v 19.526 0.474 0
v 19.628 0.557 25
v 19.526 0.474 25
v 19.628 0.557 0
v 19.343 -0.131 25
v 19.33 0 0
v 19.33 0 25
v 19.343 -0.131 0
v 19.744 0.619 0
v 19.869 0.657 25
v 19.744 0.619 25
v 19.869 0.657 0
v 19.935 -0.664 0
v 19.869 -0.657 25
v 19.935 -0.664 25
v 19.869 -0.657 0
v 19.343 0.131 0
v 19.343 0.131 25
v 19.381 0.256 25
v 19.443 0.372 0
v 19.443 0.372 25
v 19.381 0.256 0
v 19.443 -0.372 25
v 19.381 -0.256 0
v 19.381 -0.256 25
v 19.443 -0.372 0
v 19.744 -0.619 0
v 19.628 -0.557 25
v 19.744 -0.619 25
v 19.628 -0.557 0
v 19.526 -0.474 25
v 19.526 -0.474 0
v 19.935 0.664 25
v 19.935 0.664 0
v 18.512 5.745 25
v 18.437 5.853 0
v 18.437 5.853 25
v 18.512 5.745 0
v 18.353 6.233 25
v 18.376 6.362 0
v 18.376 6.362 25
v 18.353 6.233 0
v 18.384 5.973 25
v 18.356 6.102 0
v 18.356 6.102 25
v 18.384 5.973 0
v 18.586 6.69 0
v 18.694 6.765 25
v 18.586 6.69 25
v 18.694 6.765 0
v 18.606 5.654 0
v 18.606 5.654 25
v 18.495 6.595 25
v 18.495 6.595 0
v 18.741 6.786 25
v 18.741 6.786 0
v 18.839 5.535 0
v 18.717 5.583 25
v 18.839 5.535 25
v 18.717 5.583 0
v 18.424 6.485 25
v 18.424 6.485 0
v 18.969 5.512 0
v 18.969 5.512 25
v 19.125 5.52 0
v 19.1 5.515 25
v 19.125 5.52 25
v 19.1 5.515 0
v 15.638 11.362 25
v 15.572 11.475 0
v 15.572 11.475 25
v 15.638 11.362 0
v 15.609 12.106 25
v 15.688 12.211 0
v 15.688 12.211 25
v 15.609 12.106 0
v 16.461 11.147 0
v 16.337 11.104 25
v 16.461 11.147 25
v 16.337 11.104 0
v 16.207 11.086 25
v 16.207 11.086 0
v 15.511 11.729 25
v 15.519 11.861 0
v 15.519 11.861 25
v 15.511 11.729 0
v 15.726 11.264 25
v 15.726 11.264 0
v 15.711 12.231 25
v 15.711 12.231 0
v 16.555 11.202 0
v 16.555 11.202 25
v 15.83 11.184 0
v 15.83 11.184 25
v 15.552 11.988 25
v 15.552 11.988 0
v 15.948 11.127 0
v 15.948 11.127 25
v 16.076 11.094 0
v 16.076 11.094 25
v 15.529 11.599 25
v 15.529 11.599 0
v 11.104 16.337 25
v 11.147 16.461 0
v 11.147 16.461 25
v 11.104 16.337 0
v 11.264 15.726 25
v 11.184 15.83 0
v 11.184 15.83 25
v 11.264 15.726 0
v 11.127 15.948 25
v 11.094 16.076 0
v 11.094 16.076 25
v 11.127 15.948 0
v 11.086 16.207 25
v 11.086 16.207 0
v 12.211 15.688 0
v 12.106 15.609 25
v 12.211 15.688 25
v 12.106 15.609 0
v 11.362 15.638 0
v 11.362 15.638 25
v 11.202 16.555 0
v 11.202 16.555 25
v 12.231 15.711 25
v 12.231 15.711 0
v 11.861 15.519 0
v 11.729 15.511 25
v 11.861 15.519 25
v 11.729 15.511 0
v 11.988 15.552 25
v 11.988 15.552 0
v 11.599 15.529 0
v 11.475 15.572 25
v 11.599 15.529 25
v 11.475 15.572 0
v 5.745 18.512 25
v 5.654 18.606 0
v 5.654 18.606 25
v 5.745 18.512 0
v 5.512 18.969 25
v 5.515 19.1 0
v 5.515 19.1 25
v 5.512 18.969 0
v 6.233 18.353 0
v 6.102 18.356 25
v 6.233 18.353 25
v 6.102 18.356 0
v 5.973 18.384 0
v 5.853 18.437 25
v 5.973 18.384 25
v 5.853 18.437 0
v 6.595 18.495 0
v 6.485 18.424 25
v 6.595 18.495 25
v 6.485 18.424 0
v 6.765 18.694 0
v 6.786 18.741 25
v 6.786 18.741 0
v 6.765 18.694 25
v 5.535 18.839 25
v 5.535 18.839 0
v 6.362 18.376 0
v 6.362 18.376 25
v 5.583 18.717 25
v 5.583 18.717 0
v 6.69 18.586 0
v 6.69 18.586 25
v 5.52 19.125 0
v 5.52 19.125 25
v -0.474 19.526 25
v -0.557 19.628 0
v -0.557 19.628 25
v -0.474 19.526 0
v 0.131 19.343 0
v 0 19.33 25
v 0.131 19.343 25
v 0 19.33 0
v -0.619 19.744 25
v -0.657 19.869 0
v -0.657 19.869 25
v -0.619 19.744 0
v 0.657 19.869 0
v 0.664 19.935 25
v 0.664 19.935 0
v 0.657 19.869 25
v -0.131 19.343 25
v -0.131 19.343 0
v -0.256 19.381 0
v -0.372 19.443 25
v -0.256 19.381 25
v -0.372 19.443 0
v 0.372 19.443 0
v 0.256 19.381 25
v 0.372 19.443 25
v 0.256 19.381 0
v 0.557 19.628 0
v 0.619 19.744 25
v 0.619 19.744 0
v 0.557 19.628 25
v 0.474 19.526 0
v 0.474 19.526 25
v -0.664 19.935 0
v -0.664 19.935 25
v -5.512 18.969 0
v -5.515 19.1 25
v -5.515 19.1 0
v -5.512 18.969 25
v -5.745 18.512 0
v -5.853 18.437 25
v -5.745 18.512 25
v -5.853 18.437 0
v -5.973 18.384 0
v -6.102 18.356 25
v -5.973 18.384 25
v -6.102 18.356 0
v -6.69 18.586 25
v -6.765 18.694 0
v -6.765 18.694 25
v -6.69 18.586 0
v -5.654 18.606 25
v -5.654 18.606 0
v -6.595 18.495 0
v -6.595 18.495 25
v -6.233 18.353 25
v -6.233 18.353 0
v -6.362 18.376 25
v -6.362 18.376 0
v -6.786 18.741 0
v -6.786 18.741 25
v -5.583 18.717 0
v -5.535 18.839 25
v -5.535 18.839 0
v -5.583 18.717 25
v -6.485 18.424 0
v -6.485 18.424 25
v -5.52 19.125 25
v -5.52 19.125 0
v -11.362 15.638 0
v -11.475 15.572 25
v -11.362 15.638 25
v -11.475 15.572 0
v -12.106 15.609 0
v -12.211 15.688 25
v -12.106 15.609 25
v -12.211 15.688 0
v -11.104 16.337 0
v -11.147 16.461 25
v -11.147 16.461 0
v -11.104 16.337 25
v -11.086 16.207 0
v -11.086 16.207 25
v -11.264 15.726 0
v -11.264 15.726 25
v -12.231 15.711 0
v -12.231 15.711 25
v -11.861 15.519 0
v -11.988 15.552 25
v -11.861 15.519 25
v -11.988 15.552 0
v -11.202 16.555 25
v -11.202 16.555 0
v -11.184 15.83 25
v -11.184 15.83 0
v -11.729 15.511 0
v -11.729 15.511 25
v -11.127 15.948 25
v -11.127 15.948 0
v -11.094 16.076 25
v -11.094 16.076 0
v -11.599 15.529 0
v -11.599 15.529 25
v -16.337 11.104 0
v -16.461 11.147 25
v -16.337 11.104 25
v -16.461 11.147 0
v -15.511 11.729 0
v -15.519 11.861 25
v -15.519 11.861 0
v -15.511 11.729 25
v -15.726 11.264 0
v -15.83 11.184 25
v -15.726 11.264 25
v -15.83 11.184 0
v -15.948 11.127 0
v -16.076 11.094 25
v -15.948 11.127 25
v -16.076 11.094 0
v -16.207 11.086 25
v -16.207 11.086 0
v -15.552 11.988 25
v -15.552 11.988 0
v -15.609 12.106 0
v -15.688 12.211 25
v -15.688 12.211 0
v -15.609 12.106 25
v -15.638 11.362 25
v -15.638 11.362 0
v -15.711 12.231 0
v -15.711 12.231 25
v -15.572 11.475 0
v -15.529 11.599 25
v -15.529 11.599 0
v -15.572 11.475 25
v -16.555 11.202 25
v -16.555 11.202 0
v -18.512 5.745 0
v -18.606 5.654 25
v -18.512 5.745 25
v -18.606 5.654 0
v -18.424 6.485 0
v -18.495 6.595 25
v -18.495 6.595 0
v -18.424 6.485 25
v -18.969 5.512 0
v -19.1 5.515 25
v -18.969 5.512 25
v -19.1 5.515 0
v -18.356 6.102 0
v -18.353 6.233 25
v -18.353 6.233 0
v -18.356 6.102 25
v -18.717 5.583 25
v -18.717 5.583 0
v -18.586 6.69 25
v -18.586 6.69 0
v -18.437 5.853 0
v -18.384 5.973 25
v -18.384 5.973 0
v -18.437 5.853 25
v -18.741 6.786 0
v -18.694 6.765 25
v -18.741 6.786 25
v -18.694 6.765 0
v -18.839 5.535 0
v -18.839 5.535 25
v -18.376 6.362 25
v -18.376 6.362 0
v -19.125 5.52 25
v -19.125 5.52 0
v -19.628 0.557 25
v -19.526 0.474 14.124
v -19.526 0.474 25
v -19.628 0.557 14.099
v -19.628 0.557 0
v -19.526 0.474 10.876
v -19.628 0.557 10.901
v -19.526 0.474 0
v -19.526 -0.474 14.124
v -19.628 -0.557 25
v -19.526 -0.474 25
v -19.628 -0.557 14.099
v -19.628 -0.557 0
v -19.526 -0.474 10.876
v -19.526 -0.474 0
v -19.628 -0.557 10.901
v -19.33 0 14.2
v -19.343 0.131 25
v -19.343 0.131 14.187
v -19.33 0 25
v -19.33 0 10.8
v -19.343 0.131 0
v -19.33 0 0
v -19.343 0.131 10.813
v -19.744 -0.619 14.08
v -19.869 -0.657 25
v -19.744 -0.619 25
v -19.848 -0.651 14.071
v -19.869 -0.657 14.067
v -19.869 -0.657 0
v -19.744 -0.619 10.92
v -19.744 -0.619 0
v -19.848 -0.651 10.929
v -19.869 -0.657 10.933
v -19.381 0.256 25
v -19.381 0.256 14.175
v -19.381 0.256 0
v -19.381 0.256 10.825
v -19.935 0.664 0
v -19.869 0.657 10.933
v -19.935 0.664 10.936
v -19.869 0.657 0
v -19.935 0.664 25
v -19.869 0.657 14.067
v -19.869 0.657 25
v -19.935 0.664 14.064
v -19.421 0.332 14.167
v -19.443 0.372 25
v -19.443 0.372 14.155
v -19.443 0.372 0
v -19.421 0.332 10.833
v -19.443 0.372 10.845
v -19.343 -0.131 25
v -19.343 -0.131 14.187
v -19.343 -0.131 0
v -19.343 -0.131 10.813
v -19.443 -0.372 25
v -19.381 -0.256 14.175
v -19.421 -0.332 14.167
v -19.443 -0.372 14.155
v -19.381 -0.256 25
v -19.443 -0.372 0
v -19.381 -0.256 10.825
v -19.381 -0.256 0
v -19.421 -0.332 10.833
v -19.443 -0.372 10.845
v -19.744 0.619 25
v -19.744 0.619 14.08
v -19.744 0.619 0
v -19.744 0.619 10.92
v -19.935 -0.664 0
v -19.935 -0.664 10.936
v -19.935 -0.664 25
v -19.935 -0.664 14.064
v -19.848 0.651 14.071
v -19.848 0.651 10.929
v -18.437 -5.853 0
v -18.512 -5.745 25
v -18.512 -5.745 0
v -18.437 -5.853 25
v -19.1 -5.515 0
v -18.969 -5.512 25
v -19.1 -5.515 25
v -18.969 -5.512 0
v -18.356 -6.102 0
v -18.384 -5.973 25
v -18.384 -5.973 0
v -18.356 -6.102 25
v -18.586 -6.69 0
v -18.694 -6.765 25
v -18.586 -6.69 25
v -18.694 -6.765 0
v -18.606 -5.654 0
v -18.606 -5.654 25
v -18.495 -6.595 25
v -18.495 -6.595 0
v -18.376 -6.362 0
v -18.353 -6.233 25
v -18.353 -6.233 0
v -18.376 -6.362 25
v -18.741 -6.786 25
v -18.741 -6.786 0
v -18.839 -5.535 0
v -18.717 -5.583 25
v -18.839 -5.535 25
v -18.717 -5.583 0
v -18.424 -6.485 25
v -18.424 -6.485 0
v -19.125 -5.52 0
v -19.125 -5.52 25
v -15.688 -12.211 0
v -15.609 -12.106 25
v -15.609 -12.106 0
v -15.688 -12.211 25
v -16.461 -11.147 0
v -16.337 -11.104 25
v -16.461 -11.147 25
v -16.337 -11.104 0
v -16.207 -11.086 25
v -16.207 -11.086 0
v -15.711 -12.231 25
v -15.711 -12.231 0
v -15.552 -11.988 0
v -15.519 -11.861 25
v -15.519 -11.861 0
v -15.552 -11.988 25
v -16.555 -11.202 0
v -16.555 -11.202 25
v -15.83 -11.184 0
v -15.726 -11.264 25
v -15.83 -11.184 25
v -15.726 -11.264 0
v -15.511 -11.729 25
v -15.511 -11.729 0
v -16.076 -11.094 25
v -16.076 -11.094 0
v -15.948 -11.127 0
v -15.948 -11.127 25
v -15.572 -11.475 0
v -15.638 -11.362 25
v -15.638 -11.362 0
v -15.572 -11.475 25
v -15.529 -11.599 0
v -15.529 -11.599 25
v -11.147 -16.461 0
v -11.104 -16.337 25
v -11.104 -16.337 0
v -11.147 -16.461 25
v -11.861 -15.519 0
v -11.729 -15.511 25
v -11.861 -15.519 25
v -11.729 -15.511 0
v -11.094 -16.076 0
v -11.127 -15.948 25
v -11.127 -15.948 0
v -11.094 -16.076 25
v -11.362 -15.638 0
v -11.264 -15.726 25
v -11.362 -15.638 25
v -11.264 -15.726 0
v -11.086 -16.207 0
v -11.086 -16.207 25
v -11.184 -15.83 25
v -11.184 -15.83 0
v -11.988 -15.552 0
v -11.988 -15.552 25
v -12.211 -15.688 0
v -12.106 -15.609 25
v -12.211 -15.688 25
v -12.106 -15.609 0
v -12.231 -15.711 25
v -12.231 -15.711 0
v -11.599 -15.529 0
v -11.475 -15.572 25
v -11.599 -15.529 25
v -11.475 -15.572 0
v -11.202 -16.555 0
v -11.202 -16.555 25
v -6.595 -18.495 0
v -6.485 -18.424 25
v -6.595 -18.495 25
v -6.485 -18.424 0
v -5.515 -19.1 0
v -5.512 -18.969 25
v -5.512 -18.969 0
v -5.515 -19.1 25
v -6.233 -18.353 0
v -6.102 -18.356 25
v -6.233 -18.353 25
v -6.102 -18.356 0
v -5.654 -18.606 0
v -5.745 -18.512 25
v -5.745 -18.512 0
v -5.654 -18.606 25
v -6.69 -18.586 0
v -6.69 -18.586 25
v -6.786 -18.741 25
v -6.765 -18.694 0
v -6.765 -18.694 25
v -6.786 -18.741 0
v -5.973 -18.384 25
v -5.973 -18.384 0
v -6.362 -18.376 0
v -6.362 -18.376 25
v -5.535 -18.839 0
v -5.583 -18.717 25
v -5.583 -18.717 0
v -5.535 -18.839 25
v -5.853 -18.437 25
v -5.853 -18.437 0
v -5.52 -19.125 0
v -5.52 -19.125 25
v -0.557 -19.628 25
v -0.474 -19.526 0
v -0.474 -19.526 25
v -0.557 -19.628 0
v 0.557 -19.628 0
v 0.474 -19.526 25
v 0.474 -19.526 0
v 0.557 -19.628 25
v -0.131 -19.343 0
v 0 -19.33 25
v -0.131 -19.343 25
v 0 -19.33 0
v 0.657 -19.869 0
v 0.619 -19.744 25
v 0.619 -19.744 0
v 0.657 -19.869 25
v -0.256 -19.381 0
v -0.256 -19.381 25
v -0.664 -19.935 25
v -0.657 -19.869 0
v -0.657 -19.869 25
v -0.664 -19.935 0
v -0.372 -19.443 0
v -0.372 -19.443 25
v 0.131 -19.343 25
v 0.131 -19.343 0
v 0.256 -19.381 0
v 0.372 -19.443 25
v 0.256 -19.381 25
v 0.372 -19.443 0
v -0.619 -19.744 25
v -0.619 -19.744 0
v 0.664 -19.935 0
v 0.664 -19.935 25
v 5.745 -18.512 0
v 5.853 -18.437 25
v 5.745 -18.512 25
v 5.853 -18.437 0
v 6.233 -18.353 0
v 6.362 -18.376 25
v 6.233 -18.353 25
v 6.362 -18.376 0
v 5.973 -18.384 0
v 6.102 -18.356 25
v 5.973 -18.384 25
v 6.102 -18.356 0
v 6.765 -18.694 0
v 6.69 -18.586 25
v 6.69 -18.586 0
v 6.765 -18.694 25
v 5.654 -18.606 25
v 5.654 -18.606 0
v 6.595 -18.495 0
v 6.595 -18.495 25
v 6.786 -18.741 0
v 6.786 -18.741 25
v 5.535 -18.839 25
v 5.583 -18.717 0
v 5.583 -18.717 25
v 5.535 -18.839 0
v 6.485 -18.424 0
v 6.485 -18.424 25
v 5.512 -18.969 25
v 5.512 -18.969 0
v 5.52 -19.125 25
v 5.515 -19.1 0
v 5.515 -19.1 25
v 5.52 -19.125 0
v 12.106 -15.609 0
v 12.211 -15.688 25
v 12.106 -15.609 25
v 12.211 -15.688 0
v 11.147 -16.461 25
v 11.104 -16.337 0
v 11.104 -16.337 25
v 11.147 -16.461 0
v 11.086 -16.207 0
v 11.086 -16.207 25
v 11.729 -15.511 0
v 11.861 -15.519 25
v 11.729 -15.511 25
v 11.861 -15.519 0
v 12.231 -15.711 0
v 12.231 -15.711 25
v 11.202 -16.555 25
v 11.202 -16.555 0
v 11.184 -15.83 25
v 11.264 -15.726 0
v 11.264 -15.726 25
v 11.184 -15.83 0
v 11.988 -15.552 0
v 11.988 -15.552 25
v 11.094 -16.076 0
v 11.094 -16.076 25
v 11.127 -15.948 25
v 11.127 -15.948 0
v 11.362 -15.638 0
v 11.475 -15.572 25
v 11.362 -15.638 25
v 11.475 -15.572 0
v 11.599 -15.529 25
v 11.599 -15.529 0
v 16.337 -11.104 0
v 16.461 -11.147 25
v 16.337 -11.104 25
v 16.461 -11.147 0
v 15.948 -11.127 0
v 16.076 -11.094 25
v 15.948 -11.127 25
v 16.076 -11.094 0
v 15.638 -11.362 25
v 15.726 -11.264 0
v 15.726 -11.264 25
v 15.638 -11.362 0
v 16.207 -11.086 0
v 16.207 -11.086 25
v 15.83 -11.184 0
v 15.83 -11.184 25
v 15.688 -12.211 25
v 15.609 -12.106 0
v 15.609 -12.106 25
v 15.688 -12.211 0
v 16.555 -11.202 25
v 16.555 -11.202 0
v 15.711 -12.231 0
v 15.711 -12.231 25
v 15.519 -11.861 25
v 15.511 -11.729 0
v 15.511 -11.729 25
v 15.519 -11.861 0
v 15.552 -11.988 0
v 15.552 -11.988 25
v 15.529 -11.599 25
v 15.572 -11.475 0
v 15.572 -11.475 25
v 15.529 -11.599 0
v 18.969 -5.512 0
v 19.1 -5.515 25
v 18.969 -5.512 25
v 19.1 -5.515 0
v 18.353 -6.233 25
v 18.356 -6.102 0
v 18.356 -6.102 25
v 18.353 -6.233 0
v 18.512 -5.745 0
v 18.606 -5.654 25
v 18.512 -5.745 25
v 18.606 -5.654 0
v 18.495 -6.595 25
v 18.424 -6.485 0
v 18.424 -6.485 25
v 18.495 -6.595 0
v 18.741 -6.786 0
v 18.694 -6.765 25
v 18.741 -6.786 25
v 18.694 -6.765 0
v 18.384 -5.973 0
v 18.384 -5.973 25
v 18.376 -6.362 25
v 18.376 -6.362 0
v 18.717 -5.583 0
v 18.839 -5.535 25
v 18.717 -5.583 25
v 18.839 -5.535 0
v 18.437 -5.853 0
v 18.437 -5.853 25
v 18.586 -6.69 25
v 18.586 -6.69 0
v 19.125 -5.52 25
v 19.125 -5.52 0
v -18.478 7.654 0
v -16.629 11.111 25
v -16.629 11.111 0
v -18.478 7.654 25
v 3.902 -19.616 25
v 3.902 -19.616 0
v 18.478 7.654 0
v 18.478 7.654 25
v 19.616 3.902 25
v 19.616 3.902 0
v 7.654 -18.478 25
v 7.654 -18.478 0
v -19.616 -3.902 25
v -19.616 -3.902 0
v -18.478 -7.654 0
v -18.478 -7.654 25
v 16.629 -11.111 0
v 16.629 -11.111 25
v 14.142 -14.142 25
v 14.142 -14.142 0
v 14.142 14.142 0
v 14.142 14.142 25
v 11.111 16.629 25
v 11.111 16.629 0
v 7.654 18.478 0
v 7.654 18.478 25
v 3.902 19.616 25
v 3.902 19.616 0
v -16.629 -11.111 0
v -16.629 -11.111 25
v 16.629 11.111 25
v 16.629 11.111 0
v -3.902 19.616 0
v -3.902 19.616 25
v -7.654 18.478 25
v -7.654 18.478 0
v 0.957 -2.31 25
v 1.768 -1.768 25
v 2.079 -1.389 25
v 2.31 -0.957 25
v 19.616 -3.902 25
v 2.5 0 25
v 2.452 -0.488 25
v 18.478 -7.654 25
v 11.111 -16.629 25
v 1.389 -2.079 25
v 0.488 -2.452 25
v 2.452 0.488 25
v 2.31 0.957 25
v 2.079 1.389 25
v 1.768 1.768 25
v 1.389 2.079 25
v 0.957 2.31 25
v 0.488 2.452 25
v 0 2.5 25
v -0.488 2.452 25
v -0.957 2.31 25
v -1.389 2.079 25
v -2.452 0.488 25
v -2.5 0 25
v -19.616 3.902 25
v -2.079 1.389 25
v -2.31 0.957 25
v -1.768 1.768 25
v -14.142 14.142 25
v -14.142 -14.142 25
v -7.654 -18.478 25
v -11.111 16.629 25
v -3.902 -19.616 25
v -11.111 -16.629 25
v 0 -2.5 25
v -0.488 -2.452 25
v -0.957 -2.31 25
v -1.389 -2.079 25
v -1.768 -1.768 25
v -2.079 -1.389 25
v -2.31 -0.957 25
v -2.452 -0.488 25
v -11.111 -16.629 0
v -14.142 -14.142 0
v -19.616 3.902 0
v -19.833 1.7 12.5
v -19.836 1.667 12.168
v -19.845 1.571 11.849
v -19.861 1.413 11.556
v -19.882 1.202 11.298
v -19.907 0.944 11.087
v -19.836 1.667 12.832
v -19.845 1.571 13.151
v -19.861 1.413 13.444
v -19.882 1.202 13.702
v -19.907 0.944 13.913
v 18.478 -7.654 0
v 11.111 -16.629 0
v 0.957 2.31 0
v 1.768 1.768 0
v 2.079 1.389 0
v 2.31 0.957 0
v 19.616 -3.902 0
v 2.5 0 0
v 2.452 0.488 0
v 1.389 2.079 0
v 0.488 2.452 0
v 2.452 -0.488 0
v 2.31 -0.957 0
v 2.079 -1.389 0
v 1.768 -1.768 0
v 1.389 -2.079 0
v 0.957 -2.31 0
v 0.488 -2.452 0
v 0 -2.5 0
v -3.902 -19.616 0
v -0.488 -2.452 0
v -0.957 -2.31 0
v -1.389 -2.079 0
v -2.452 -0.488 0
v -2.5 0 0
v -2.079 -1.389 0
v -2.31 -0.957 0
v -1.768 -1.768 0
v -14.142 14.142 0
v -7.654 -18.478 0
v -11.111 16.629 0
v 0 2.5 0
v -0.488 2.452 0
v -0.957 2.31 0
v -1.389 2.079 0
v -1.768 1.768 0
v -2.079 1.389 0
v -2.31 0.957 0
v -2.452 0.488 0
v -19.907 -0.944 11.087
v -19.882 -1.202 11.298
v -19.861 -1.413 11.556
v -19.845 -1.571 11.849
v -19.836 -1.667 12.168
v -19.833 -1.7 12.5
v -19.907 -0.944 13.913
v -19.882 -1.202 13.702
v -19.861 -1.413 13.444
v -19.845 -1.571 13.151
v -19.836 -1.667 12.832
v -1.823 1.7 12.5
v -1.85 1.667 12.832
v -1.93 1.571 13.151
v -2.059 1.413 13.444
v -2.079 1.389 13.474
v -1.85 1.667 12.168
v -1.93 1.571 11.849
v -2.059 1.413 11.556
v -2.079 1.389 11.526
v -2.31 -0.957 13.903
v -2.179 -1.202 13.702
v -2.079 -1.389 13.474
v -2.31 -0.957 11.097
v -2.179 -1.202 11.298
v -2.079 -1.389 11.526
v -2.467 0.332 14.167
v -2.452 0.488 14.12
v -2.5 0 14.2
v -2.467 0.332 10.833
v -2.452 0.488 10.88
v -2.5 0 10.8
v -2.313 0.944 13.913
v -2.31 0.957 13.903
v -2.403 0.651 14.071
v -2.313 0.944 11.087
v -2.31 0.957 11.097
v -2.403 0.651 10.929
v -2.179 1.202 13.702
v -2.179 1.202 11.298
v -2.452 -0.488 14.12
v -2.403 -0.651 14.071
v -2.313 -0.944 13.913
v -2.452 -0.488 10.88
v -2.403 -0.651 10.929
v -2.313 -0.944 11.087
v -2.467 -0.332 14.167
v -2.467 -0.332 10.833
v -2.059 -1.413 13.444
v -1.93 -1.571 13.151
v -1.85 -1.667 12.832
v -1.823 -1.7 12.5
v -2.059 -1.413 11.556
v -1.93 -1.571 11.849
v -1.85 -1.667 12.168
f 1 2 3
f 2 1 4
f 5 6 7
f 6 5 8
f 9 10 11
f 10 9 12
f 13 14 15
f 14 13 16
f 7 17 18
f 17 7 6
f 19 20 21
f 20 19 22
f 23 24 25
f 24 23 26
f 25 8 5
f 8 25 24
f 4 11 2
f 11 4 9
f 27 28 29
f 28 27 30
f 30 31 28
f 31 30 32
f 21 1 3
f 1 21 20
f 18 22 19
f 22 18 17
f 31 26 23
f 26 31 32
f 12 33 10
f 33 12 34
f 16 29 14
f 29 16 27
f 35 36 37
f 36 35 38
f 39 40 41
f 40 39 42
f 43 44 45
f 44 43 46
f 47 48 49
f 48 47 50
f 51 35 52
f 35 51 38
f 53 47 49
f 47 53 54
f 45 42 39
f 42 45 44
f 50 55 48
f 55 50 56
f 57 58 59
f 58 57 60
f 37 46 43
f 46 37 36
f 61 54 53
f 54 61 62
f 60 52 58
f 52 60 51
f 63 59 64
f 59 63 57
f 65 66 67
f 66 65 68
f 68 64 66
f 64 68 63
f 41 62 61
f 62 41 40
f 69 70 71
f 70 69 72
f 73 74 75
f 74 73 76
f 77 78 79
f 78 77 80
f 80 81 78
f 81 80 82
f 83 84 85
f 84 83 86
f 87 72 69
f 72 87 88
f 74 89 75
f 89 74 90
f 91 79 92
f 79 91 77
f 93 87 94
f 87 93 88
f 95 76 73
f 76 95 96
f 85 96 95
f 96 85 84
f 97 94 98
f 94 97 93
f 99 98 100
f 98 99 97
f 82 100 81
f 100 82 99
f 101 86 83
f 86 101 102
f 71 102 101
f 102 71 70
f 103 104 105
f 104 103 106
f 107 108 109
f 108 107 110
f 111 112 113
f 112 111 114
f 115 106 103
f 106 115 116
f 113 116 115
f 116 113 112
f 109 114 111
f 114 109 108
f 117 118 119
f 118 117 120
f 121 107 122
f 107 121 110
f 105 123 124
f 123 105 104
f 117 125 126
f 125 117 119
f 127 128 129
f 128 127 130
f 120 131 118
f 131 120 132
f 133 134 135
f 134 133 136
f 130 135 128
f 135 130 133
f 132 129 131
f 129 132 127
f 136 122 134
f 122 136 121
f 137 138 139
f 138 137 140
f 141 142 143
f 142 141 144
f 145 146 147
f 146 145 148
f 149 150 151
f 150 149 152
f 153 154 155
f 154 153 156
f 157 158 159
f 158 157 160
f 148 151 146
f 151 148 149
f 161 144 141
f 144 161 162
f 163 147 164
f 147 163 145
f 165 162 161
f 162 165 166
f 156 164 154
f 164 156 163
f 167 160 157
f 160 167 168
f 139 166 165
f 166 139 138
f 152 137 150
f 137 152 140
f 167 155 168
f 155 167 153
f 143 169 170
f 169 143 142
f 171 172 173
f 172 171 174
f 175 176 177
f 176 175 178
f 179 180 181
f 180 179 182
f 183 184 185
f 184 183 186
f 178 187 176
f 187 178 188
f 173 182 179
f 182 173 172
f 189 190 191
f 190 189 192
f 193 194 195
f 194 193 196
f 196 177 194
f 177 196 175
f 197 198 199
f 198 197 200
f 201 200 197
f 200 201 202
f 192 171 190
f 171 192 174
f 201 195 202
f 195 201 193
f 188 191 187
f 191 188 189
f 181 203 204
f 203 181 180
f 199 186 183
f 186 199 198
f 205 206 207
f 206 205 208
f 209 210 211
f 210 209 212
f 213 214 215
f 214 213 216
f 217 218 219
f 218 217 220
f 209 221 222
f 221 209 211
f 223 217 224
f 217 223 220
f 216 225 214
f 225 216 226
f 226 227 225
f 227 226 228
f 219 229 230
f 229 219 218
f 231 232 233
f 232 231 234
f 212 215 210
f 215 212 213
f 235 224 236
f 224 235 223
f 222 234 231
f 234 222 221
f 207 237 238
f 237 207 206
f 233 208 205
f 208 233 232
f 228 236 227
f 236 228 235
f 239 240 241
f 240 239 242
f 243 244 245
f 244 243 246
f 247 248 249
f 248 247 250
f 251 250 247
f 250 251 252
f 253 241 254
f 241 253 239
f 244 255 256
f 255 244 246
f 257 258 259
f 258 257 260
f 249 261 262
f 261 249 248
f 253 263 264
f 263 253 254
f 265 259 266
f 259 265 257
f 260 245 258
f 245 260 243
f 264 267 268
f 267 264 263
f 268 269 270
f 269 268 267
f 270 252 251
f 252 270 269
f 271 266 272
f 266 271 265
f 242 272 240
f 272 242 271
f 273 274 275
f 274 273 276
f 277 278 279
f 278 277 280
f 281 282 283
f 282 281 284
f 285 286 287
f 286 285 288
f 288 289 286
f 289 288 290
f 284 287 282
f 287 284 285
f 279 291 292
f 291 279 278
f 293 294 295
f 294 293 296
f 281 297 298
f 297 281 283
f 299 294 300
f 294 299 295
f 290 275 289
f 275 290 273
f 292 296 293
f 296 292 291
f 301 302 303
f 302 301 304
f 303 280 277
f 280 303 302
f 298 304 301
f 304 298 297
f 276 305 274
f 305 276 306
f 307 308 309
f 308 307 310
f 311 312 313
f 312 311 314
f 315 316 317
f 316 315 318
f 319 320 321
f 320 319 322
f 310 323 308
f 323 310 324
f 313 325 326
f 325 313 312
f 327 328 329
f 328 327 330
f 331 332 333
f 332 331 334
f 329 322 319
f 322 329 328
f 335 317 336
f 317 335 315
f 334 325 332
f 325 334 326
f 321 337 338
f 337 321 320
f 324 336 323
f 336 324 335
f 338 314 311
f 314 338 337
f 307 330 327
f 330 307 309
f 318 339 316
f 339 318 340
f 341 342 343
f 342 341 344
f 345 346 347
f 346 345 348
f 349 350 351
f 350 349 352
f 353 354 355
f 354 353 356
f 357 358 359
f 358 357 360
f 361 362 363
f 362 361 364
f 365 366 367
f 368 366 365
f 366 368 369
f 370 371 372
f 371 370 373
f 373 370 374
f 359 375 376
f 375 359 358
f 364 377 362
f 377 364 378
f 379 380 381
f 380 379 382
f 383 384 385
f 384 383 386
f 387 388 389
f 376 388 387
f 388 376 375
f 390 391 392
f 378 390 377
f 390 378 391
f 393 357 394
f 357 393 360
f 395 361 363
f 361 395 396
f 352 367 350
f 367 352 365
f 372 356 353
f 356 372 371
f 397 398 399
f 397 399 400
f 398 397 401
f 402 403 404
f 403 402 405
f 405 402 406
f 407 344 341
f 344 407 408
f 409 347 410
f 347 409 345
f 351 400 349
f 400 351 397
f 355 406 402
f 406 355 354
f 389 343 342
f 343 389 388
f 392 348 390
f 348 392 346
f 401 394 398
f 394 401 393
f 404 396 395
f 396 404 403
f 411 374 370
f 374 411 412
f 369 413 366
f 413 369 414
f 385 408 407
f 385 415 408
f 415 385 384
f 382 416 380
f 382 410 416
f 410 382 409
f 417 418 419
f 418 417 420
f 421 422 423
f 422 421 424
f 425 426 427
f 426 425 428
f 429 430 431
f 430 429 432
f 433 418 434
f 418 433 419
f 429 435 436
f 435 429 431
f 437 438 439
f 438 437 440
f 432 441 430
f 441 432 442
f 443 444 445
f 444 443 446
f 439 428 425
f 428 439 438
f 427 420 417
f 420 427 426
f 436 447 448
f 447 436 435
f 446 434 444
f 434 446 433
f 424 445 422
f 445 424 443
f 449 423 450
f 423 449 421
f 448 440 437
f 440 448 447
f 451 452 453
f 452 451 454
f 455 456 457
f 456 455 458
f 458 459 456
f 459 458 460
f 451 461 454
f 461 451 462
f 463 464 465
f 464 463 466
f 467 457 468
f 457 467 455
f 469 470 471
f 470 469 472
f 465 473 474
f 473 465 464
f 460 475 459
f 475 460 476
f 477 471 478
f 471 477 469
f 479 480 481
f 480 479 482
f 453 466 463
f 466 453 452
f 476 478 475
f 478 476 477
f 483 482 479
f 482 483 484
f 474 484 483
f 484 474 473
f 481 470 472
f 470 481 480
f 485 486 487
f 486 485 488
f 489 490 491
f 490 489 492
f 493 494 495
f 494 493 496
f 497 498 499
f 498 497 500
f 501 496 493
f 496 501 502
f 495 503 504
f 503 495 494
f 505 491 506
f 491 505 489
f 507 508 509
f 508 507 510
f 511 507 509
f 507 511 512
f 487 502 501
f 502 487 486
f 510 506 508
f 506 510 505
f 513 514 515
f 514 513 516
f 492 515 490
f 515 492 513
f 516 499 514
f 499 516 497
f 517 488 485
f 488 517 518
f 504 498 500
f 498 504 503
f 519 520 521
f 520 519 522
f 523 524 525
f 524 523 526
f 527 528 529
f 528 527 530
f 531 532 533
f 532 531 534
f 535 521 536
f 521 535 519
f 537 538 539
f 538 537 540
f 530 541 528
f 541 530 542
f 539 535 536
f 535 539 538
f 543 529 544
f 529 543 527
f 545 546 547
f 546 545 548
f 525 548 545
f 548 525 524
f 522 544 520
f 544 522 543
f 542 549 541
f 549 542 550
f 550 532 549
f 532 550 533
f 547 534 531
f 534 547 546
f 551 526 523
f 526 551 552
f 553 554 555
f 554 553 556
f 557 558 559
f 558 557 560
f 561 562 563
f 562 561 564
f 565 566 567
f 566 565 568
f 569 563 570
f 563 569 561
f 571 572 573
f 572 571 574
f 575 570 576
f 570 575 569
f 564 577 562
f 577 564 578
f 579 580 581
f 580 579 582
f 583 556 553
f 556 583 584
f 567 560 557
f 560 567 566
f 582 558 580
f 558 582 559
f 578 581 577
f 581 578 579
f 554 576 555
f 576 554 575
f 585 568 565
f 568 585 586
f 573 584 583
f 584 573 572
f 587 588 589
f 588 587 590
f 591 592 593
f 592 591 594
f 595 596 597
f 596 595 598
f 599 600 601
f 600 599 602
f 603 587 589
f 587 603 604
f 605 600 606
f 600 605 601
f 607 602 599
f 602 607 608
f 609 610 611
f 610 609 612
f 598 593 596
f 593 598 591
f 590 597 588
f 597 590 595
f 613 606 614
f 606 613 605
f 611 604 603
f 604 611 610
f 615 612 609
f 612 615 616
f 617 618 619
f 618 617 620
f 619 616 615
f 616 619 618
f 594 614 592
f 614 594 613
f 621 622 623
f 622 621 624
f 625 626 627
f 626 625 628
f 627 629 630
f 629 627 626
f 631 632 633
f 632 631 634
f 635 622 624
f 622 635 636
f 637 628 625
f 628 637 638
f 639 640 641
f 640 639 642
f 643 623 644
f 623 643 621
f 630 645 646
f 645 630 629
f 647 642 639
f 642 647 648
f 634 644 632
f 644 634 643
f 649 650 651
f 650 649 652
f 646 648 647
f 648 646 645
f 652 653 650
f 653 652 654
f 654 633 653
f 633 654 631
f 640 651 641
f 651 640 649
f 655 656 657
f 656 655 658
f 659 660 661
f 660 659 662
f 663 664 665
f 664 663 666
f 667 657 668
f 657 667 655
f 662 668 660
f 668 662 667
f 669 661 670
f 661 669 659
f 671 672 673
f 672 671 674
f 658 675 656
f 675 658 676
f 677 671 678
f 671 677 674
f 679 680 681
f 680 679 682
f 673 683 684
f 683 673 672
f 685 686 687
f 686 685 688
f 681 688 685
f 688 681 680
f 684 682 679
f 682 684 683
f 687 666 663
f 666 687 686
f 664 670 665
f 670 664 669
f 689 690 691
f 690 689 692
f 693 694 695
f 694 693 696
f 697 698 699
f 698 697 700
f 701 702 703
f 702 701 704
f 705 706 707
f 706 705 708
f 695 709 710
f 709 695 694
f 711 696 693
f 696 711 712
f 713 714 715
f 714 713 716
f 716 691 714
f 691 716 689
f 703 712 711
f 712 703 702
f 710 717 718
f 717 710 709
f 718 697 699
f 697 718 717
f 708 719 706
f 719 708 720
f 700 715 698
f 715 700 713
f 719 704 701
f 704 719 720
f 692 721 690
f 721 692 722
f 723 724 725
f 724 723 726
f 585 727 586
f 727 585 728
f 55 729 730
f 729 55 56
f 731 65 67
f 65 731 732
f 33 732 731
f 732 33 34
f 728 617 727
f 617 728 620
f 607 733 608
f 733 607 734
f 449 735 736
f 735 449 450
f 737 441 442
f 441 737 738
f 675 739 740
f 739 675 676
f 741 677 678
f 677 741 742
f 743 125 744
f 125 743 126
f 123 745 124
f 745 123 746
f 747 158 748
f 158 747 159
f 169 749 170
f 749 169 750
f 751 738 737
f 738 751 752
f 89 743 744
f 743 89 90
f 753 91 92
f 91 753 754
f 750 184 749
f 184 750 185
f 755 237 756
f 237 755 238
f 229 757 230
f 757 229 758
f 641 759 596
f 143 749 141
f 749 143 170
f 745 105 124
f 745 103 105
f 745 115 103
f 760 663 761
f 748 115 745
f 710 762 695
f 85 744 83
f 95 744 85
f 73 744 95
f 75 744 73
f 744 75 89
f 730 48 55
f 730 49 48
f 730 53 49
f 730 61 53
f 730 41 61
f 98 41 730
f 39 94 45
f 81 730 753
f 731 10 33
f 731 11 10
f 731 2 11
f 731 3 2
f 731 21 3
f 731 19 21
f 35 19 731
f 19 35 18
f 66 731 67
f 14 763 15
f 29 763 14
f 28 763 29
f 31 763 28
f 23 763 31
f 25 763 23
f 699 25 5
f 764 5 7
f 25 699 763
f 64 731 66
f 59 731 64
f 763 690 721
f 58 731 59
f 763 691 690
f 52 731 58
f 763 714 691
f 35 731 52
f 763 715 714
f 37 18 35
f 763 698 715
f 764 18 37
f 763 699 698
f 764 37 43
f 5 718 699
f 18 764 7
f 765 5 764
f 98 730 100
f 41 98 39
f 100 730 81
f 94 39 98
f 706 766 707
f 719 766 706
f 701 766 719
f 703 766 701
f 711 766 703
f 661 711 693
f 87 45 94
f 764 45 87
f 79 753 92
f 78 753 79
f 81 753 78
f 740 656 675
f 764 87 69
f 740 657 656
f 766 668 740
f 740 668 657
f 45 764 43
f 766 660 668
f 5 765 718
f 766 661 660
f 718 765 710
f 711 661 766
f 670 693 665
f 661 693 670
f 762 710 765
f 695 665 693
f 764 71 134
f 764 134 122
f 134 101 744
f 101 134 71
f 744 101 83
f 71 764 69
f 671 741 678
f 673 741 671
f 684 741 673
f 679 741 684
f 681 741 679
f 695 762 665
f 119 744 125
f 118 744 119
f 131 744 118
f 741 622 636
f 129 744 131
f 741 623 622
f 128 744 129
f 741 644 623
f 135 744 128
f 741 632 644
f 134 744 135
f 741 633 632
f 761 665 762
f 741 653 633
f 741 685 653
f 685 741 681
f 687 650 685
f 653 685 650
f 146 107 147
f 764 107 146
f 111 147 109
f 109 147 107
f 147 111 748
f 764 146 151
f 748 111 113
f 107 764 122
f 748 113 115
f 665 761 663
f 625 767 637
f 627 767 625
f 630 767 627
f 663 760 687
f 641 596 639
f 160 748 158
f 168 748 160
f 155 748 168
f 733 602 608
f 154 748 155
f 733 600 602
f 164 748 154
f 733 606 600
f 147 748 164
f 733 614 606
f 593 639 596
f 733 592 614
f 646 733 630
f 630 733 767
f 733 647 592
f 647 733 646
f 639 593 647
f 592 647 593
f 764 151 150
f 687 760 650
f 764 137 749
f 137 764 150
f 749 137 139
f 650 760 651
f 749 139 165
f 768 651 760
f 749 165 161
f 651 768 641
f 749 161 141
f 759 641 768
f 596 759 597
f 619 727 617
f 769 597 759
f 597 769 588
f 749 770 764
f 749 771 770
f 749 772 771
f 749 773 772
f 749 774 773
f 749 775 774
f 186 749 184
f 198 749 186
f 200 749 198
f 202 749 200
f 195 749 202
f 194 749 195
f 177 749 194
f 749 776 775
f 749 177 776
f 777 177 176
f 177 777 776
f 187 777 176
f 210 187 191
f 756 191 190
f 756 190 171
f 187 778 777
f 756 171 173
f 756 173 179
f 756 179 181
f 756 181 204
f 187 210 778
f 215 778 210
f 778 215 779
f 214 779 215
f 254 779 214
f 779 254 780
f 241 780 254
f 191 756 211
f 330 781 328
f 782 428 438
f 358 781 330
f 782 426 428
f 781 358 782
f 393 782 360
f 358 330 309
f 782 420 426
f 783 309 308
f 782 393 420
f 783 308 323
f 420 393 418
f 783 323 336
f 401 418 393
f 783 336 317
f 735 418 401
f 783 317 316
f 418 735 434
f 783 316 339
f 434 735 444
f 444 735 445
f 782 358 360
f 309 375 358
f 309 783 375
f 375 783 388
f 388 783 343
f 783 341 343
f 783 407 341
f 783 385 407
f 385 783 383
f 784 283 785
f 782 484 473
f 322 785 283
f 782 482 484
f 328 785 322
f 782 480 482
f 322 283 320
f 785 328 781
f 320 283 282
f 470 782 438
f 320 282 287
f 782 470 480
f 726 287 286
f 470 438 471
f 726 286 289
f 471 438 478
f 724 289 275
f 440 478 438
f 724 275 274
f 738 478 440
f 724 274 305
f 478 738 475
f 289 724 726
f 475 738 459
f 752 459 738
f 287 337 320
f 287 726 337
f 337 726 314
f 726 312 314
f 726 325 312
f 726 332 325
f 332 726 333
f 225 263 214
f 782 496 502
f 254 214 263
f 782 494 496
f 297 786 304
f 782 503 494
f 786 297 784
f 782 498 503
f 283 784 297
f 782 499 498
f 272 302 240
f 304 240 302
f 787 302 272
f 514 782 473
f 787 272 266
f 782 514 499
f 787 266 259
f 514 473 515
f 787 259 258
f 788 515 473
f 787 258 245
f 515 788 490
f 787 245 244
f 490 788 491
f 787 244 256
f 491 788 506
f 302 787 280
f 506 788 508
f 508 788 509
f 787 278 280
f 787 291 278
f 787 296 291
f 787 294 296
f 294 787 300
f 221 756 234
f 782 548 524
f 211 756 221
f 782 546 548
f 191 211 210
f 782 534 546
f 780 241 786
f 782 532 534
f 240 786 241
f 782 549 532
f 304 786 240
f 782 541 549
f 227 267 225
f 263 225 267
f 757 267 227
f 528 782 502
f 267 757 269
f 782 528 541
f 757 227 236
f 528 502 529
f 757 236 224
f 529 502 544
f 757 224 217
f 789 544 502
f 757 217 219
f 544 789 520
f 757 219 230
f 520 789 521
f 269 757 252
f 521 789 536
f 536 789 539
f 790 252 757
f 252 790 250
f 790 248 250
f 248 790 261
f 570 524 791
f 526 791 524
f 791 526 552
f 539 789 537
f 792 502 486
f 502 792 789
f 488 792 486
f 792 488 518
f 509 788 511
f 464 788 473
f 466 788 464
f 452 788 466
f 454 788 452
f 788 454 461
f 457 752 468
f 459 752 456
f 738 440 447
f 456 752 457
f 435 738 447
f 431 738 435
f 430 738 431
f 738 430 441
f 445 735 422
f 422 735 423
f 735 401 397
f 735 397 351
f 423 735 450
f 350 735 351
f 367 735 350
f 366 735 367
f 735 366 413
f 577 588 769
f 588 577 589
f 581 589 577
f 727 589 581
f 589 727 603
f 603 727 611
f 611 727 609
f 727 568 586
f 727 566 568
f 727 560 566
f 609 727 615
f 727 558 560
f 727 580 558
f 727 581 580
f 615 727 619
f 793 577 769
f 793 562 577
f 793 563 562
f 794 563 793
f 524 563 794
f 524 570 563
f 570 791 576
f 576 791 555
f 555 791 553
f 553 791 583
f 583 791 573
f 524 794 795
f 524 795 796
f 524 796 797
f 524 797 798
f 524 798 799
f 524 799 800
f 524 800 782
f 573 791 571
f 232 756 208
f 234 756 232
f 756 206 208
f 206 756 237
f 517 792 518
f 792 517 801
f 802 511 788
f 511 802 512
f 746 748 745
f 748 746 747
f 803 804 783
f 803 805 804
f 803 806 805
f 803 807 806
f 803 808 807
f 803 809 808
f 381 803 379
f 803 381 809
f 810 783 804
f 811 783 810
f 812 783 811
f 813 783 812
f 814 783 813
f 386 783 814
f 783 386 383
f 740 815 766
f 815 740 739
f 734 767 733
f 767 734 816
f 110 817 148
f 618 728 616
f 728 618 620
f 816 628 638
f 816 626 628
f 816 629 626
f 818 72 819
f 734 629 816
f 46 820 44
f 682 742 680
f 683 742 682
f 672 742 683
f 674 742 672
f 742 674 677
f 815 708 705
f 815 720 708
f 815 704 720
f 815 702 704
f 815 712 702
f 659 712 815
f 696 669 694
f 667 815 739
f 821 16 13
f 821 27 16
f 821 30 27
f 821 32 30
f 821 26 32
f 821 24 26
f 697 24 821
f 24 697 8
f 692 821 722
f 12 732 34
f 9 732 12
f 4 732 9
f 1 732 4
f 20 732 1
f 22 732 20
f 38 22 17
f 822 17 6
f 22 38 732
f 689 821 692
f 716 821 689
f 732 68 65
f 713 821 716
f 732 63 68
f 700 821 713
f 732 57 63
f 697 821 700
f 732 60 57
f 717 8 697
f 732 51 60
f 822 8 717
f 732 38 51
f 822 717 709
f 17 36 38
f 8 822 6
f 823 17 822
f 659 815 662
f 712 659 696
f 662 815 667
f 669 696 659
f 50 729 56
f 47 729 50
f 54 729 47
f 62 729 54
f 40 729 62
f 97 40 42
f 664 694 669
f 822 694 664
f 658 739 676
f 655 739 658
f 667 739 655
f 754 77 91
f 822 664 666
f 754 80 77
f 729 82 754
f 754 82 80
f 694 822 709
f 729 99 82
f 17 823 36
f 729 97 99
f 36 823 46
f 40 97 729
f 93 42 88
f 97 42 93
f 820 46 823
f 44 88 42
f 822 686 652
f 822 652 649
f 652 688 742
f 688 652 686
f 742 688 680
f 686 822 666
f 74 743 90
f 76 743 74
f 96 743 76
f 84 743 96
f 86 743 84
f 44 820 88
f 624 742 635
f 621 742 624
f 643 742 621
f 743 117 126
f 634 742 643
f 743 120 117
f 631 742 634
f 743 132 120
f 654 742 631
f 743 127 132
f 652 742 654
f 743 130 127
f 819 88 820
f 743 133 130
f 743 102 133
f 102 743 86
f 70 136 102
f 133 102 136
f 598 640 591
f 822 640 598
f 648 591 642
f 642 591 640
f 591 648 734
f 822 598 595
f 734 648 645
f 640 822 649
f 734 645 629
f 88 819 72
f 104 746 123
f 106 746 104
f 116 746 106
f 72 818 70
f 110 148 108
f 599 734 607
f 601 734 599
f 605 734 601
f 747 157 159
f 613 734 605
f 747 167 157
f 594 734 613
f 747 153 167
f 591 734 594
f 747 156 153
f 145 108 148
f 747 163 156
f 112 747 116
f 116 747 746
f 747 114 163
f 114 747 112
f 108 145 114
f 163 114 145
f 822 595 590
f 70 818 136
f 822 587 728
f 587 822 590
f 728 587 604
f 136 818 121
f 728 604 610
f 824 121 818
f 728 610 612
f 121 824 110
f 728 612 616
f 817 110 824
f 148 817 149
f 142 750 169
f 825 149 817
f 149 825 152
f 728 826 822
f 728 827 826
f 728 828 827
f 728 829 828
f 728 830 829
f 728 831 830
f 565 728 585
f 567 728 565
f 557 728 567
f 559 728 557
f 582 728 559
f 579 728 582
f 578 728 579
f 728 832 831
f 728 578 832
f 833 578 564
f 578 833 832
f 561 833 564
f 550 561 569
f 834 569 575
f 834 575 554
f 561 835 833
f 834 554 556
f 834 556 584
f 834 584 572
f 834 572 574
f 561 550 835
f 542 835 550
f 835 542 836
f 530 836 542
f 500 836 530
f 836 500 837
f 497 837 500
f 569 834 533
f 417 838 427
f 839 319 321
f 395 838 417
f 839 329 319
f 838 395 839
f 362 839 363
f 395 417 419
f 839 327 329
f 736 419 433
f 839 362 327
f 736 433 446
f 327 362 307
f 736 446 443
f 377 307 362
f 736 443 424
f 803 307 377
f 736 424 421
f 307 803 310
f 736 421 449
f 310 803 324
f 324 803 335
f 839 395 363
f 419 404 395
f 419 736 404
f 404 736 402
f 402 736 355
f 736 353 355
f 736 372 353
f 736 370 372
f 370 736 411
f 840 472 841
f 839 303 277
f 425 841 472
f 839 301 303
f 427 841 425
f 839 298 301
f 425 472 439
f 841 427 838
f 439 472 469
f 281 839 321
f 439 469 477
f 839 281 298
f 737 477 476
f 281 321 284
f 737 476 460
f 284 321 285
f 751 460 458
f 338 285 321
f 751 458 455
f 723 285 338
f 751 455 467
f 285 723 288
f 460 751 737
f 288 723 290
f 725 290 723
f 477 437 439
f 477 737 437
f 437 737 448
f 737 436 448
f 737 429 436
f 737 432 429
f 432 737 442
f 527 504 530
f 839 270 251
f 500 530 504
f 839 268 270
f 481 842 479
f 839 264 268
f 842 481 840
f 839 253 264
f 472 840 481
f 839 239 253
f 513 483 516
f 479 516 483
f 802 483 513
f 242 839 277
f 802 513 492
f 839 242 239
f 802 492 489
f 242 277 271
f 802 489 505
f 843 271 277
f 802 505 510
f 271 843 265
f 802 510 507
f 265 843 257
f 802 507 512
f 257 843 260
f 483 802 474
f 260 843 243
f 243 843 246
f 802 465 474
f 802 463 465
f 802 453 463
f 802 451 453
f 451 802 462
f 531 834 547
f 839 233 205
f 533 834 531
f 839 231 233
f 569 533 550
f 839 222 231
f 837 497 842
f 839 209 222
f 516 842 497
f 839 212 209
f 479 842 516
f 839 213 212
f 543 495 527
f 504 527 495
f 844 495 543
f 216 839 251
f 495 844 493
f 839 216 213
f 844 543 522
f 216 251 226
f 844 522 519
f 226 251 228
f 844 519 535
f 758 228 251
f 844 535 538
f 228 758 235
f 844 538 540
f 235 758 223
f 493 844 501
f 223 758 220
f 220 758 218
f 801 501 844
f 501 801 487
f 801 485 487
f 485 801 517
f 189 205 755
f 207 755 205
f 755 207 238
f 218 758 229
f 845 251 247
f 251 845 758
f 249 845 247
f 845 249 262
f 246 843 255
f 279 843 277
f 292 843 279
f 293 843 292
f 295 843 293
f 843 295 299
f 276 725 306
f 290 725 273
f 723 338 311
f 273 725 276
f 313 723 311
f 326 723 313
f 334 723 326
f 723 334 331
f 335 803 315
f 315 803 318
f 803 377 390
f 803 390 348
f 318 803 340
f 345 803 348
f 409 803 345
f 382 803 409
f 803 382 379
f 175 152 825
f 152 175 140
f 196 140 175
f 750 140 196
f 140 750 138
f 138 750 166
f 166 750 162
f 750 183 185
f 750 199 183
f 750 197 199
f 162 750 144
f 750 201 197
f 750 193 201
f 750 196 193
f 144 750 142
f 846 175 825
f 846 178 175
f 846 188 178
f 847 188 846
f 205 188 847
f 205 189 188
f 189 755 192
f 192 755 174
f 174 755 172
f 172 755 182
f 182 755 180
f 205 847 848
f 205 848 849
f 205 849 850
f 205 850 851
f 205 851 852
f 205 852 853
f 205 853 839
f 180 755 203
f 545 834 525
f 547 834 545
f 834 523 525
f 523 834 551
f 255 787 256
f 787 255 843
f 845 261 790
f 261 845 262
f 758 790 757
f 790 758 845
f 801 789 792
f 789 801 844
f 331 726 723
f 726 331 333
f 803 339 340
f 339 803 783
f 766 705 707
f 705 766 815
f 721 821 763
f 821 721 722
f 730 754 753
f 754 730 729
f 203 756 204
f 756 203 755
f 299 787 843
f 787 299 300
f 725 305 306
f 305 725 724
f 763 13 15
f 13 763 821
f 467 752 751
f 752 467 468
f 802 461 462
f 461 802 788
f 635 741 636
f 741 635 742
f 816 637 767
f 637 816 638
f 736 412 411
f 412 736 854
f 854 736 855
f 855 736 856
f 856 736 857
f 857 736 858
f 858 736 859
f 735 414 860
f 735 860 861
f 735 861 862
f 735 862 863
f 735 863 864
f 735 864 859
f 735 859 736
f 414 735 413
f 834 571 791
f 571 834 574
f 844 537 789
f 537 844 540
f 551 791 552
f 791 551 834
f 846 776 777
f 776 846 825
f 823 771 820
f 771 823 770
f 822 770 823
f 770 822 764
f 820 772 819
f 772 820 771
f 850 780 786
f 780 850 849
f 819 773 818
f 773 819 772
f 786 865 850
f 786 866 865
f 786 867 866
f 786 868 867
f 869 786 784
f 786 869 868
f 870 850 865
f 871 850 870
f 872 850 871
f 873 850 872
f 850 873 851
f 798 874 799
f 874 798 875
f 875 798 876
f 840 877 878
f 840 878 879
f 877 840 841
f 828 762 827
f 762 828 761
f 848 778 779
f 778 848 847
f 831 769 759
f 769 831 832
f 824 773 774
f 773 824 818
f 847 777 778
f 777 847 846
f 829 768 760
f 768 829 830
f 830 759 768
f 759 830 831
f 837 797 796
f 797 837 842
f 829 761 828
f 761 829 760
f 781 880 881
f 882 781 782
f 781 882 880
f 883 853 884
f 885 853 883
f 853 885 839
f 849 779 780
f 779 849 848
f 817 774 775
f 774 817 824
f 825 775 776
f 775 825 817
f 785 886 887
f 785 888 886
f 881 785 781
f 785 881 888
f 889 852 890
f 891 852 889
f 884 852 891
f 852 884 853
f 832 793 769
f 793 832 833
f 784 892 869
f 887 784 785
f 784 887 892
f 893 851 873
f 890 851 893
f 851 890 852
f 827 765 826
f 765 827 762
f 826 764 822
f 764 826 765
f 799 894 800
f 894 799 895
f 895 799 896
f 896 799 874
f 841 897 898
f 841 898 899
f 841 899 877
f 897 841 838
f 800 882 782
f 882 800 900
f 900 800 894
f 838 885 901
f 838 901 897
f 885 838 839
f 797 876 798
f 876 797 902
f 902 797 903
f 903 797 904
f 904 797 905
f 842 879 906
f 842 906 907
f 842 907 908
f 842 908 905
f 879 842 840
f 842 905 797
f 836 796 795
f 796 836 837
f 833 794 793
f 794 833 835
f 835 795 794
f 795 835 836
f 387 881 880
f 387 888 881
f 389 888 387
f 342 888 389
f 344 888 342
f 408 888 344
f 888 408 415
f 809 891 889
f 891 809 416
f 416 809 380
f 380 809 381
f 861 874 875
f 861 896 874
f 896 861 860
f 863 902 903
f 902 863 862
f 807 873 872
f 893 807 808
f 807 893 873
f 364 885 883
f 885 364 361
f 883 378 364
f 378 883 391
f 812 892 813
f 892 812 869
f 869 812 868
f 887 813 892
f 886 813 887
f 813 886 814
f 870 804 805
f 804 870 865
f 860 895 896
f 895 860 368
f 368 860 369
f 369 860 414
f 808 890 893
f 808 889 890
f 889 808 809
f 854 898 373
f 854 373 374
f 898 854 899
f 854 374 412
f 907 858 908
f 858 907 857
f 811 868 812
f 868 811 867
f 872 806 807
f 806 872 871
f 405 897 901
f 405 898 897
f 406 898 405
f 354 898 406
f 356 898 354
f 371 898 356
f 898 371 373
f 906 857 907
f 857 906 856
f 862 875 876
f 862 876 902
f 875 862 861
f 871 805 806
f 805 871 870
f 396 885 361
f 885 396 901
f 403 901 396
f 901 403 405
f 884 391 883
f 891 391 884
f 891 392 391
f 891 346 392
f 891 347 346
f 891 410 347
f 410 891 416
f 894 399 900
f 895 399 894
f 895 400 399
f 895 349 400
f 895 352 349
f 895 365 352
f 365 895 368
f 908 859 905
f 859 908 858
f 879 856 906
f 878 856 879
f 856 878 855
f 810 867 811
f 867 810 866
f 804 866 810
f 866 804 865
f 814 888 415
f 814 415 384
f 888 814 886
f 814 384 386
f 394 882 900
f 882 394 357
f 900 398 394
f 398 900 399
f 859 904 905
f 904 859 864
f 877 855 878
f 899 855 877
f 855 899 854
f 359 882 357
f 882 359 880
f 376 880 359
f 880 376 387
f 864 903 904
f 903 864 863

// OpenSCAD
$fn = 32;

// ----------------------------------------------------------------------
// Hand knob: 40 x 40 x 25 mm
// ----------------------------------------------------------------------

// --- parameters (mm) ---
head_d = 40;              // knob diameter
head_h = 25;              // knob height
hole_d = 5;               // shaft bore
set_d = 3.4;              // set screw tap hole
notch_d = 1.34;           // knurl groove diameter
knurl_n = 20;             // number of knurl grooves

module body() {
  cylinder(h = head_h, d = head_d);
}

difference() {
  union() {
    body();
  }
  translate([0, 0, -1]) cylinder(h = head_h + 0 + 2, d = hole_d);
  /* knurl grooves */
  for (i = [0 : knurl_n - 1])
    rotate([0, 0, i * 360 / knurl_n])
      translate([head_d / 2, 0, -0.5])
        cylinder(h = head_h + 1, d = notch_d);
  translate([-head_d / 2 - 1, 0, head_h * 0.5]) rotate([0, 90, 0]) cylinder(h = head_d / 2 + 2, d = set_d);
}
